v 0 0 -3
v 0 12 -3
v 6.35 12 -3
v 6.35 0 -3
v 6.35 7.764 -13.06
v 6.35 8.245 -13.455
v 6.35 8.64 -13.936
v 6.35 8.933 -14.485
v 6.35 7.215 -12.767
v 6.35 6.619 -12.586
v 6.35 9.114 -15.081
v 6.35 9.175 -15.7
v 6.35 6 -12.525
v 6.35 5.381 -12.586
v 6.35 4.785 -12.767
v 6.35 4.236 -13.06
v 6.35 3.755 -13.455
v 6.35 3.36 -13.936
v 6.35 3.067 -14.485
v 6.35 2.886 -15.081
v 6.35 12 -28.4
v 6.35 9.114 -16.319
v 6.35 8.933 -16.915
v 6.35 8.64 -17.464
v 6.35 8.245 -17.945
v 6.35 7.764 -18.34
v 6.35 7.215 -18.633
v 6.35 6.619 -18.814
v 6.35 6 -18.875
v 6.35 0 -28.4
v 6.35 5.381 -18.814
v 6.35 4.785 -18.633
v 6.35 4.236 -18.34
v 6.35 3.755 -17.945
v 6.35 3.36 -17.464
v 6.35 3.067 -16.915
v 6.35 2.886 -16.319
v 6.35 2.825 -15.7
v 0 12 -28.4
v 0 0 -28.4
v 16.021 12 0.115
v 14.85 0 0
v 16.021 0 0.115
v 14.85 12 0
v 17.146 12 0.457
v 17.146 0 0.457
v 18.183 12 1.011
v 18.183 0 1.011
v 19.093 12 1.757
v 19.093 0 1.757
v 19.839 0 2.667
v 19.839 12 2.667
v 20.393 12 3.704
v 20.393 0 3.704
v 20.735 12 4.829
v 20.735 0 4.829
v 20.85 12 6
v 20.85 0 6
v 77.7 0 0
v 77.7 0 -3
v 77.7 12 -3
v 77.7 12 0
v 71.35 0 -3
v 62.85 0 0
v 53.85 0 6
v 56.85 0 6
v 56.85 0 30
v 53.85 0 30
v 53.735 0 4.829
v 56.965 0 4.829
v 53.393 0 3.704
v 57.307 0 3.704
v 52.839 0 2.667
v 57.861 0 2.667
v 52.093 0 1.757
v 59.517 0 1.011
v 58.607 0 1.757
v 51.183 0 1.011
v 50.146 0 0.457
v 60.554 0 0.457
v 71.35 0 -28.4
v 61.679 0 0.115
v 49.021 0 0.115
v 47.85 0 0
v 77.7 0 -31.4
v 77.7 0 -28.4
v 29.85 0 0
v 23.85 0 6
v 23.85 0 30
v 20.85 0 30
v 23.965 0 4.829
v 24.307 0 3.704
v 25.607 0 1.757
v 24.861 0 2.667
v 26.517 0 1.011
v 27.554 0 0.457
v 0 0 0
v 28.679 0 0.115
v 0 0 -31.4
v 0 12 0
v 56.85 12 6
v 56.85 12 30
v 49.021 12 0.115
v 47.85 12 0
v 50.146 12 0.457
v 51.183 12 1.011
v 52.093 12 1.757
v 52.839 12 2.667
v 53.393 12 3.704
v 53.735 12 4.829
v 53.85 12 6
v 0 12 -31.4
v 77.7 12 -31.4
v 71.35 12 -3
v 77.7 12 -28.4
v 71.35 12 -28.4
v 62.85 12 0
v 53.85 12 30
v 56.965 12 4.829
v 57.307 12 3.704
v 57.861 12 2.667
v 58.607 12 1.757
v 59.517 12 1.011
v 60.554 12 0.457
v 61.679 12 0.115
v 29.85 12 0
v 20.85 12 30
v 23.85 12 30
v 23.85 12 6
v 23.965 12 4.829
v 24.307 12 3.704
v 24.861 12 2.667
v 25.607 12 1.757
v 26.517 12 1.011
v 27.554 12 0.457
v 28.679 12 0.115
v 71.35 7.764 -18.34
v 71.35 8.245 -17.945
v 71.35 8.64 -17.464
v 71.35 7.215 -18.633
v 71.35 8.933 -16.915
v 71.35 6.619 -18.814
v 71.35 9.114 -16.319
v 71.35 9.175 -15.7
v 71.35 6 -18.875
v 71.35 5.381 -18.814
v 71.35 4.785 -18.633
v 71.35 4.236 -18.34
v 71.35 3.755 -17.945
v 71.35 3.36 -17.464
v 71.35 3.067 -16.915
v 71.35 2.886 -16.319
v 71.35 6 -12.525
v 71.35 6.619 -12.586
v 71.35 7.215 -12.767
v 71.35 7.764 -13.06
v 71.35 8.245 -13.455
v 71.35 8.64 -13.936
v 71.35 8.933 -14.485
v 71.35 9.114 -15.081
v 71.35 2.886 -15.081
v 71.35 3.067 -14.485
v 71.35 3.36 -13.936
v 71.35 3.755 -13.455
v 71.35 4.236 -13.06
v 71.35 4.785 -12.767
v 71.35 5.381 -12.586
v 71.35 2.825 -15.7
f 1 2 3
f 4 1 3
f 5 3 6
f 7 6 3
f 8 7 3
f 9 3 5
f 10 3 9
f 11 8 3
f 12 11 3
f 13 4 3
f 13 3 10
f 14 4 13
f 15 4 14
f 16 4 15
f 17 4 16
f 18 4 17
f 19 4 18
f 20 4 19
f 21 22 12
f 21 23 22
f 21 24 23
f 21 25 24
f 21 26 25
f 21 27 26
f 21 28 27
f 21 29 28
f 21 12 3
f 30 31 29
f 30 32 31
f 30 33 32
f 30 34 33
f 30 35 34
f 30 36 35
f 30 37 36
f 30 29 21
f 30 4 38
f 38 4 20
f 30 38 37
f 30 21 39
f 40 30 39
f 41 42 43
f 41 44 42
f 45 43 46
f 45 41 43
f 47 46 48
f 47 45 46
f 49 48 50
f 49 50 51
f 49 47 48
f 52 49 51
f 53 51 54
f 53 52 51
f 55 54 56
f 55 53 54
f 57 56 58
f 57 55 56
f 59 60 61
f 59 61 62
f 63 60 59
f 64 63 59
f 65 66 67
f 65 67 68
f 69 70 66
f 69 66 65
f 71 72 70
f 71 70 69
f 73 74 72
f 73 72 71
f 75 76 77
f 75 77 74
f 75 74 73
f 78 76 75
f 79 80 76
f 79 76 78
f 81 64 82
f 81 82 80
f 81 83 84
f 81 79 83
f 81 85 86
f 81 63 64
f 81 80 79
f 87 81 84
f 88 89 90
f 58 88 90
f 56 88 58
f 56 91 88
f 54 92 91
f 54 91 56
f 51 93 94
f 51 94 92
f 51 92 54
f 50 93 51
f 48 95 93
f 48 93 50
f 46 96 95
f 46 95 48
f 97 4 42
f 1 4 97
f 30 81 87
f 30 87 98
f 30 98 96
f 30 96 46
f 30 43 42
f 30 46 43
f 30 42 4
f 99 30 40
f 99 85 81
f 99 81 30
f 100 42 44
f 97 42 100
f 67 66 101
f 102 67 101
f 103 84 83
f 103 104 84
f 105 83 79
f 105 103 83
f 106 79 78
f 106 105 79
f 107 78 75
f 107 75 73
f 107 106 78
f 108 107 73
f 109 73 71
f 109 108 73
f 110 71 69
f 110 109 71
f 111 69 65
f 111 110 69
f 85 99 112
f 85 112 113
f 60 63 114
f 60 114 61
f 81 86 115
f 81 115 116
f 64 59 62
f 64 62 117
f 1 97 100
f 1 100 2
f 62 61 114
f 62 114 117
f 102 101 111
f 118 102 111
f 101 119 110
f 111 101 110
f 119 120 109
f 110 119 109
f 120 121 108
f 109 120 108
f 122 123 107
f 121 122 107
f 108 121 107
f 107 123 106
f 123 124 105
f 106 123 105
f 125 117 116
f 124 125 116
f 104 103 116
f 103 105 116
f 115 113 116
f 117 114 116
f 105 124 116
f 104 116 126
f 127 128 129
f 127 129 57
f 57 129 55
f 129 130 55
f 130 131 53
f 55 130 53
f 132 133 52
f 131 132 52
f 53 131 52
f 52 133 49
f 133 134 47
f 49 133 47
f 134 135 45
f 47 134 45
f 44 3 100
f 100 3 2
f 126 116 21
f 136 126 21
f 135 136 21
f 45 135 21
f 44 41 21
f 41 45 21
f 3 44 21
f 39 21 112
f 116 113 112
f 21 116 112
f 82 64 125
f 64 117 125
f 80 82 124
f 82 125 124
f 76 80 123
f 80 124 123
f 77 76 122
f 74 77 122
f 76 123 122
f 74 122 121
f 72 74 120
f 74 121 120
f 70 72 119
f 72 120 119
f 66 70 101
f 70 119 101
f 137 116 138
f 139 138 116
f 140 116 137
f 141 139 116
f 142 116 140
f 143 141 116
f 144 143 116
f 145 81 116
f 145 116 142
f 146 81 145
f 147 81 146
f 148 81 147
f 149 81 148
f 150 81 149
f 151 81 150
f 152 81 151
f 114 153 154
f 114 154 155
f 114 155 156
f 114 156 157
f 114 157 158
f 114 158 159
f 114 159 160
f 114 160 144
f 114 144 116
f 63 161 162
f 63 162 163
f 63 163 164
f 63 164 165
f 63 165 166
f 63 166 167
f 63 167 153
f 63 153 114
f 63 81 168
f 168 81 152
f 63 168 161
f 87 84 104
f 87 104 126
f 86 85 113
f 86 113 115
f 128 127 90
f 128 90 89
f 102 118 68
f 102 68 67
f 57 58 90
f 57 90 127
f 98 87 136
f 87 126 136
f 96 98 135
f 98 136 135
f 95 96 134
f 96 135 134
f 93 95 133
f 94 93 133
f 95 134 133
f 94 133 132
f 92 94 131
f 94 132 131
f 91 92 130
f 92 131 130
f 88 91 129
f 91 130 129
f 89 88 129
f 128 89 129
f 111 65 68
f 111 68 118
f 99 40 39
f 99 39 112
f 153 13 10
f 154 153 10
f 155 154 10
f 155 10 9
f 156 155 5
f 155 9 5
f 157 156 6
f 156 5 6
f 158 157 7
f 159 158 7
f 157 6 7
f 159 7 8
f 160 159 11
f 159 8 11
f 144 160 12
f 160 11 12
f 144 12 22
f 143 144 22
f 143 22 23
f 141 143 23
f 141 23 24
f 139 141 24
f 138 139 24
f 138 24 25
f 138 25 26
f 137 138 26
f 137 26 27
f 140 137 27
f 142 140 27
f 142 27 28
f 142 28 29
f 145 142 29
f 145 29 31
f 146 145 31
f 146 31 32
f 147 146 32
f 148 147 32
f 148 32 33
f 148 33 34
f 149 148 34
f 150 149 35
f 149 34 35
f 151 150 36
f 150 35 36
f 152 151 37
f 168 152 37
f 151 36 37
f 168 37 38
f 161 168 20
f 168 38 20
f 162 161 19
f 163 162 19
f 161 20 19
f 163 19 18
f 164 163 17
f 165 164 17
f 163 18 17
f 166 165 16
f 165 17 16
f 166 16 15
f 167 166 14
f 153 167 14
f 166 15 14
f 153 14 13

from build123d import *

# Parameters (mm, degrees)
BOSS_EXTRUDE1_DEPTH = 12
SKETCH2_R           = 3.175
CUT_EXTRUDE1_DEPTH  = 79.871937341
SKETCH3_W           = 3
SKETCH3_H           = 12
BOSS_EXTRUDE2_DEPTH = 30
FILLET1_R           = 6


with BuildPart() as part:
    # Sketch1 → Boss-Extrude1 (new body)
    with BuildSketch(Plane(origin=(0, 0, 0), x_dir=(1, 0, 0), z_dir=(0, 1, 0))):
        Polygon((0, 0), (0, 3), (6.35, 3), (6.35, 28.4), (0, 28.4), (0, 31.4), (77.7, 31.4), (77.7, 28.4), (71.35, 28.4), (71.35, 3), (77.7, 3), (77.7, 0), align=None)
    extrude(amount=BOSS_EXTRUDE1_DEPTH)

    # Sketch2 → Cut-Extrude1 (cut, through all)
    with BuildSketch(Plane.ZY.offset(-6.35)):
        with Locations((-15.7, 6)):
            Circle(SKETCH2_R)
    extrude(amount=-CUT_EXTRUDE1_DEPTH, mode=Mode.SUBTRACT)

    # Sketch3 → Boss-Extrude2 (add)
    with BuildSketch(Plane.XY):
        with Locations((22.35, 6)):
            Rectangle(SKETCH3_W, SKETCH3_H)
        with Locations((55.35, 6)):
            Rectangle(SKETCH3_W, SKETCH3_H)
    extrude(amount=BOSS_EXTRUDE2_DEPTH)

    # Fillet1
    fillet1_edges = [part.edges().sort_by_distance(p)[0] for p in [
        (20.85, 6, 0),
        (53.85, 6, 0),
        (23.85, 6, 0),
        (56.85, 6, 0),
    ]]
    fillet(fillet1_edges, radius=FILLET1_R)


solid = part.part
